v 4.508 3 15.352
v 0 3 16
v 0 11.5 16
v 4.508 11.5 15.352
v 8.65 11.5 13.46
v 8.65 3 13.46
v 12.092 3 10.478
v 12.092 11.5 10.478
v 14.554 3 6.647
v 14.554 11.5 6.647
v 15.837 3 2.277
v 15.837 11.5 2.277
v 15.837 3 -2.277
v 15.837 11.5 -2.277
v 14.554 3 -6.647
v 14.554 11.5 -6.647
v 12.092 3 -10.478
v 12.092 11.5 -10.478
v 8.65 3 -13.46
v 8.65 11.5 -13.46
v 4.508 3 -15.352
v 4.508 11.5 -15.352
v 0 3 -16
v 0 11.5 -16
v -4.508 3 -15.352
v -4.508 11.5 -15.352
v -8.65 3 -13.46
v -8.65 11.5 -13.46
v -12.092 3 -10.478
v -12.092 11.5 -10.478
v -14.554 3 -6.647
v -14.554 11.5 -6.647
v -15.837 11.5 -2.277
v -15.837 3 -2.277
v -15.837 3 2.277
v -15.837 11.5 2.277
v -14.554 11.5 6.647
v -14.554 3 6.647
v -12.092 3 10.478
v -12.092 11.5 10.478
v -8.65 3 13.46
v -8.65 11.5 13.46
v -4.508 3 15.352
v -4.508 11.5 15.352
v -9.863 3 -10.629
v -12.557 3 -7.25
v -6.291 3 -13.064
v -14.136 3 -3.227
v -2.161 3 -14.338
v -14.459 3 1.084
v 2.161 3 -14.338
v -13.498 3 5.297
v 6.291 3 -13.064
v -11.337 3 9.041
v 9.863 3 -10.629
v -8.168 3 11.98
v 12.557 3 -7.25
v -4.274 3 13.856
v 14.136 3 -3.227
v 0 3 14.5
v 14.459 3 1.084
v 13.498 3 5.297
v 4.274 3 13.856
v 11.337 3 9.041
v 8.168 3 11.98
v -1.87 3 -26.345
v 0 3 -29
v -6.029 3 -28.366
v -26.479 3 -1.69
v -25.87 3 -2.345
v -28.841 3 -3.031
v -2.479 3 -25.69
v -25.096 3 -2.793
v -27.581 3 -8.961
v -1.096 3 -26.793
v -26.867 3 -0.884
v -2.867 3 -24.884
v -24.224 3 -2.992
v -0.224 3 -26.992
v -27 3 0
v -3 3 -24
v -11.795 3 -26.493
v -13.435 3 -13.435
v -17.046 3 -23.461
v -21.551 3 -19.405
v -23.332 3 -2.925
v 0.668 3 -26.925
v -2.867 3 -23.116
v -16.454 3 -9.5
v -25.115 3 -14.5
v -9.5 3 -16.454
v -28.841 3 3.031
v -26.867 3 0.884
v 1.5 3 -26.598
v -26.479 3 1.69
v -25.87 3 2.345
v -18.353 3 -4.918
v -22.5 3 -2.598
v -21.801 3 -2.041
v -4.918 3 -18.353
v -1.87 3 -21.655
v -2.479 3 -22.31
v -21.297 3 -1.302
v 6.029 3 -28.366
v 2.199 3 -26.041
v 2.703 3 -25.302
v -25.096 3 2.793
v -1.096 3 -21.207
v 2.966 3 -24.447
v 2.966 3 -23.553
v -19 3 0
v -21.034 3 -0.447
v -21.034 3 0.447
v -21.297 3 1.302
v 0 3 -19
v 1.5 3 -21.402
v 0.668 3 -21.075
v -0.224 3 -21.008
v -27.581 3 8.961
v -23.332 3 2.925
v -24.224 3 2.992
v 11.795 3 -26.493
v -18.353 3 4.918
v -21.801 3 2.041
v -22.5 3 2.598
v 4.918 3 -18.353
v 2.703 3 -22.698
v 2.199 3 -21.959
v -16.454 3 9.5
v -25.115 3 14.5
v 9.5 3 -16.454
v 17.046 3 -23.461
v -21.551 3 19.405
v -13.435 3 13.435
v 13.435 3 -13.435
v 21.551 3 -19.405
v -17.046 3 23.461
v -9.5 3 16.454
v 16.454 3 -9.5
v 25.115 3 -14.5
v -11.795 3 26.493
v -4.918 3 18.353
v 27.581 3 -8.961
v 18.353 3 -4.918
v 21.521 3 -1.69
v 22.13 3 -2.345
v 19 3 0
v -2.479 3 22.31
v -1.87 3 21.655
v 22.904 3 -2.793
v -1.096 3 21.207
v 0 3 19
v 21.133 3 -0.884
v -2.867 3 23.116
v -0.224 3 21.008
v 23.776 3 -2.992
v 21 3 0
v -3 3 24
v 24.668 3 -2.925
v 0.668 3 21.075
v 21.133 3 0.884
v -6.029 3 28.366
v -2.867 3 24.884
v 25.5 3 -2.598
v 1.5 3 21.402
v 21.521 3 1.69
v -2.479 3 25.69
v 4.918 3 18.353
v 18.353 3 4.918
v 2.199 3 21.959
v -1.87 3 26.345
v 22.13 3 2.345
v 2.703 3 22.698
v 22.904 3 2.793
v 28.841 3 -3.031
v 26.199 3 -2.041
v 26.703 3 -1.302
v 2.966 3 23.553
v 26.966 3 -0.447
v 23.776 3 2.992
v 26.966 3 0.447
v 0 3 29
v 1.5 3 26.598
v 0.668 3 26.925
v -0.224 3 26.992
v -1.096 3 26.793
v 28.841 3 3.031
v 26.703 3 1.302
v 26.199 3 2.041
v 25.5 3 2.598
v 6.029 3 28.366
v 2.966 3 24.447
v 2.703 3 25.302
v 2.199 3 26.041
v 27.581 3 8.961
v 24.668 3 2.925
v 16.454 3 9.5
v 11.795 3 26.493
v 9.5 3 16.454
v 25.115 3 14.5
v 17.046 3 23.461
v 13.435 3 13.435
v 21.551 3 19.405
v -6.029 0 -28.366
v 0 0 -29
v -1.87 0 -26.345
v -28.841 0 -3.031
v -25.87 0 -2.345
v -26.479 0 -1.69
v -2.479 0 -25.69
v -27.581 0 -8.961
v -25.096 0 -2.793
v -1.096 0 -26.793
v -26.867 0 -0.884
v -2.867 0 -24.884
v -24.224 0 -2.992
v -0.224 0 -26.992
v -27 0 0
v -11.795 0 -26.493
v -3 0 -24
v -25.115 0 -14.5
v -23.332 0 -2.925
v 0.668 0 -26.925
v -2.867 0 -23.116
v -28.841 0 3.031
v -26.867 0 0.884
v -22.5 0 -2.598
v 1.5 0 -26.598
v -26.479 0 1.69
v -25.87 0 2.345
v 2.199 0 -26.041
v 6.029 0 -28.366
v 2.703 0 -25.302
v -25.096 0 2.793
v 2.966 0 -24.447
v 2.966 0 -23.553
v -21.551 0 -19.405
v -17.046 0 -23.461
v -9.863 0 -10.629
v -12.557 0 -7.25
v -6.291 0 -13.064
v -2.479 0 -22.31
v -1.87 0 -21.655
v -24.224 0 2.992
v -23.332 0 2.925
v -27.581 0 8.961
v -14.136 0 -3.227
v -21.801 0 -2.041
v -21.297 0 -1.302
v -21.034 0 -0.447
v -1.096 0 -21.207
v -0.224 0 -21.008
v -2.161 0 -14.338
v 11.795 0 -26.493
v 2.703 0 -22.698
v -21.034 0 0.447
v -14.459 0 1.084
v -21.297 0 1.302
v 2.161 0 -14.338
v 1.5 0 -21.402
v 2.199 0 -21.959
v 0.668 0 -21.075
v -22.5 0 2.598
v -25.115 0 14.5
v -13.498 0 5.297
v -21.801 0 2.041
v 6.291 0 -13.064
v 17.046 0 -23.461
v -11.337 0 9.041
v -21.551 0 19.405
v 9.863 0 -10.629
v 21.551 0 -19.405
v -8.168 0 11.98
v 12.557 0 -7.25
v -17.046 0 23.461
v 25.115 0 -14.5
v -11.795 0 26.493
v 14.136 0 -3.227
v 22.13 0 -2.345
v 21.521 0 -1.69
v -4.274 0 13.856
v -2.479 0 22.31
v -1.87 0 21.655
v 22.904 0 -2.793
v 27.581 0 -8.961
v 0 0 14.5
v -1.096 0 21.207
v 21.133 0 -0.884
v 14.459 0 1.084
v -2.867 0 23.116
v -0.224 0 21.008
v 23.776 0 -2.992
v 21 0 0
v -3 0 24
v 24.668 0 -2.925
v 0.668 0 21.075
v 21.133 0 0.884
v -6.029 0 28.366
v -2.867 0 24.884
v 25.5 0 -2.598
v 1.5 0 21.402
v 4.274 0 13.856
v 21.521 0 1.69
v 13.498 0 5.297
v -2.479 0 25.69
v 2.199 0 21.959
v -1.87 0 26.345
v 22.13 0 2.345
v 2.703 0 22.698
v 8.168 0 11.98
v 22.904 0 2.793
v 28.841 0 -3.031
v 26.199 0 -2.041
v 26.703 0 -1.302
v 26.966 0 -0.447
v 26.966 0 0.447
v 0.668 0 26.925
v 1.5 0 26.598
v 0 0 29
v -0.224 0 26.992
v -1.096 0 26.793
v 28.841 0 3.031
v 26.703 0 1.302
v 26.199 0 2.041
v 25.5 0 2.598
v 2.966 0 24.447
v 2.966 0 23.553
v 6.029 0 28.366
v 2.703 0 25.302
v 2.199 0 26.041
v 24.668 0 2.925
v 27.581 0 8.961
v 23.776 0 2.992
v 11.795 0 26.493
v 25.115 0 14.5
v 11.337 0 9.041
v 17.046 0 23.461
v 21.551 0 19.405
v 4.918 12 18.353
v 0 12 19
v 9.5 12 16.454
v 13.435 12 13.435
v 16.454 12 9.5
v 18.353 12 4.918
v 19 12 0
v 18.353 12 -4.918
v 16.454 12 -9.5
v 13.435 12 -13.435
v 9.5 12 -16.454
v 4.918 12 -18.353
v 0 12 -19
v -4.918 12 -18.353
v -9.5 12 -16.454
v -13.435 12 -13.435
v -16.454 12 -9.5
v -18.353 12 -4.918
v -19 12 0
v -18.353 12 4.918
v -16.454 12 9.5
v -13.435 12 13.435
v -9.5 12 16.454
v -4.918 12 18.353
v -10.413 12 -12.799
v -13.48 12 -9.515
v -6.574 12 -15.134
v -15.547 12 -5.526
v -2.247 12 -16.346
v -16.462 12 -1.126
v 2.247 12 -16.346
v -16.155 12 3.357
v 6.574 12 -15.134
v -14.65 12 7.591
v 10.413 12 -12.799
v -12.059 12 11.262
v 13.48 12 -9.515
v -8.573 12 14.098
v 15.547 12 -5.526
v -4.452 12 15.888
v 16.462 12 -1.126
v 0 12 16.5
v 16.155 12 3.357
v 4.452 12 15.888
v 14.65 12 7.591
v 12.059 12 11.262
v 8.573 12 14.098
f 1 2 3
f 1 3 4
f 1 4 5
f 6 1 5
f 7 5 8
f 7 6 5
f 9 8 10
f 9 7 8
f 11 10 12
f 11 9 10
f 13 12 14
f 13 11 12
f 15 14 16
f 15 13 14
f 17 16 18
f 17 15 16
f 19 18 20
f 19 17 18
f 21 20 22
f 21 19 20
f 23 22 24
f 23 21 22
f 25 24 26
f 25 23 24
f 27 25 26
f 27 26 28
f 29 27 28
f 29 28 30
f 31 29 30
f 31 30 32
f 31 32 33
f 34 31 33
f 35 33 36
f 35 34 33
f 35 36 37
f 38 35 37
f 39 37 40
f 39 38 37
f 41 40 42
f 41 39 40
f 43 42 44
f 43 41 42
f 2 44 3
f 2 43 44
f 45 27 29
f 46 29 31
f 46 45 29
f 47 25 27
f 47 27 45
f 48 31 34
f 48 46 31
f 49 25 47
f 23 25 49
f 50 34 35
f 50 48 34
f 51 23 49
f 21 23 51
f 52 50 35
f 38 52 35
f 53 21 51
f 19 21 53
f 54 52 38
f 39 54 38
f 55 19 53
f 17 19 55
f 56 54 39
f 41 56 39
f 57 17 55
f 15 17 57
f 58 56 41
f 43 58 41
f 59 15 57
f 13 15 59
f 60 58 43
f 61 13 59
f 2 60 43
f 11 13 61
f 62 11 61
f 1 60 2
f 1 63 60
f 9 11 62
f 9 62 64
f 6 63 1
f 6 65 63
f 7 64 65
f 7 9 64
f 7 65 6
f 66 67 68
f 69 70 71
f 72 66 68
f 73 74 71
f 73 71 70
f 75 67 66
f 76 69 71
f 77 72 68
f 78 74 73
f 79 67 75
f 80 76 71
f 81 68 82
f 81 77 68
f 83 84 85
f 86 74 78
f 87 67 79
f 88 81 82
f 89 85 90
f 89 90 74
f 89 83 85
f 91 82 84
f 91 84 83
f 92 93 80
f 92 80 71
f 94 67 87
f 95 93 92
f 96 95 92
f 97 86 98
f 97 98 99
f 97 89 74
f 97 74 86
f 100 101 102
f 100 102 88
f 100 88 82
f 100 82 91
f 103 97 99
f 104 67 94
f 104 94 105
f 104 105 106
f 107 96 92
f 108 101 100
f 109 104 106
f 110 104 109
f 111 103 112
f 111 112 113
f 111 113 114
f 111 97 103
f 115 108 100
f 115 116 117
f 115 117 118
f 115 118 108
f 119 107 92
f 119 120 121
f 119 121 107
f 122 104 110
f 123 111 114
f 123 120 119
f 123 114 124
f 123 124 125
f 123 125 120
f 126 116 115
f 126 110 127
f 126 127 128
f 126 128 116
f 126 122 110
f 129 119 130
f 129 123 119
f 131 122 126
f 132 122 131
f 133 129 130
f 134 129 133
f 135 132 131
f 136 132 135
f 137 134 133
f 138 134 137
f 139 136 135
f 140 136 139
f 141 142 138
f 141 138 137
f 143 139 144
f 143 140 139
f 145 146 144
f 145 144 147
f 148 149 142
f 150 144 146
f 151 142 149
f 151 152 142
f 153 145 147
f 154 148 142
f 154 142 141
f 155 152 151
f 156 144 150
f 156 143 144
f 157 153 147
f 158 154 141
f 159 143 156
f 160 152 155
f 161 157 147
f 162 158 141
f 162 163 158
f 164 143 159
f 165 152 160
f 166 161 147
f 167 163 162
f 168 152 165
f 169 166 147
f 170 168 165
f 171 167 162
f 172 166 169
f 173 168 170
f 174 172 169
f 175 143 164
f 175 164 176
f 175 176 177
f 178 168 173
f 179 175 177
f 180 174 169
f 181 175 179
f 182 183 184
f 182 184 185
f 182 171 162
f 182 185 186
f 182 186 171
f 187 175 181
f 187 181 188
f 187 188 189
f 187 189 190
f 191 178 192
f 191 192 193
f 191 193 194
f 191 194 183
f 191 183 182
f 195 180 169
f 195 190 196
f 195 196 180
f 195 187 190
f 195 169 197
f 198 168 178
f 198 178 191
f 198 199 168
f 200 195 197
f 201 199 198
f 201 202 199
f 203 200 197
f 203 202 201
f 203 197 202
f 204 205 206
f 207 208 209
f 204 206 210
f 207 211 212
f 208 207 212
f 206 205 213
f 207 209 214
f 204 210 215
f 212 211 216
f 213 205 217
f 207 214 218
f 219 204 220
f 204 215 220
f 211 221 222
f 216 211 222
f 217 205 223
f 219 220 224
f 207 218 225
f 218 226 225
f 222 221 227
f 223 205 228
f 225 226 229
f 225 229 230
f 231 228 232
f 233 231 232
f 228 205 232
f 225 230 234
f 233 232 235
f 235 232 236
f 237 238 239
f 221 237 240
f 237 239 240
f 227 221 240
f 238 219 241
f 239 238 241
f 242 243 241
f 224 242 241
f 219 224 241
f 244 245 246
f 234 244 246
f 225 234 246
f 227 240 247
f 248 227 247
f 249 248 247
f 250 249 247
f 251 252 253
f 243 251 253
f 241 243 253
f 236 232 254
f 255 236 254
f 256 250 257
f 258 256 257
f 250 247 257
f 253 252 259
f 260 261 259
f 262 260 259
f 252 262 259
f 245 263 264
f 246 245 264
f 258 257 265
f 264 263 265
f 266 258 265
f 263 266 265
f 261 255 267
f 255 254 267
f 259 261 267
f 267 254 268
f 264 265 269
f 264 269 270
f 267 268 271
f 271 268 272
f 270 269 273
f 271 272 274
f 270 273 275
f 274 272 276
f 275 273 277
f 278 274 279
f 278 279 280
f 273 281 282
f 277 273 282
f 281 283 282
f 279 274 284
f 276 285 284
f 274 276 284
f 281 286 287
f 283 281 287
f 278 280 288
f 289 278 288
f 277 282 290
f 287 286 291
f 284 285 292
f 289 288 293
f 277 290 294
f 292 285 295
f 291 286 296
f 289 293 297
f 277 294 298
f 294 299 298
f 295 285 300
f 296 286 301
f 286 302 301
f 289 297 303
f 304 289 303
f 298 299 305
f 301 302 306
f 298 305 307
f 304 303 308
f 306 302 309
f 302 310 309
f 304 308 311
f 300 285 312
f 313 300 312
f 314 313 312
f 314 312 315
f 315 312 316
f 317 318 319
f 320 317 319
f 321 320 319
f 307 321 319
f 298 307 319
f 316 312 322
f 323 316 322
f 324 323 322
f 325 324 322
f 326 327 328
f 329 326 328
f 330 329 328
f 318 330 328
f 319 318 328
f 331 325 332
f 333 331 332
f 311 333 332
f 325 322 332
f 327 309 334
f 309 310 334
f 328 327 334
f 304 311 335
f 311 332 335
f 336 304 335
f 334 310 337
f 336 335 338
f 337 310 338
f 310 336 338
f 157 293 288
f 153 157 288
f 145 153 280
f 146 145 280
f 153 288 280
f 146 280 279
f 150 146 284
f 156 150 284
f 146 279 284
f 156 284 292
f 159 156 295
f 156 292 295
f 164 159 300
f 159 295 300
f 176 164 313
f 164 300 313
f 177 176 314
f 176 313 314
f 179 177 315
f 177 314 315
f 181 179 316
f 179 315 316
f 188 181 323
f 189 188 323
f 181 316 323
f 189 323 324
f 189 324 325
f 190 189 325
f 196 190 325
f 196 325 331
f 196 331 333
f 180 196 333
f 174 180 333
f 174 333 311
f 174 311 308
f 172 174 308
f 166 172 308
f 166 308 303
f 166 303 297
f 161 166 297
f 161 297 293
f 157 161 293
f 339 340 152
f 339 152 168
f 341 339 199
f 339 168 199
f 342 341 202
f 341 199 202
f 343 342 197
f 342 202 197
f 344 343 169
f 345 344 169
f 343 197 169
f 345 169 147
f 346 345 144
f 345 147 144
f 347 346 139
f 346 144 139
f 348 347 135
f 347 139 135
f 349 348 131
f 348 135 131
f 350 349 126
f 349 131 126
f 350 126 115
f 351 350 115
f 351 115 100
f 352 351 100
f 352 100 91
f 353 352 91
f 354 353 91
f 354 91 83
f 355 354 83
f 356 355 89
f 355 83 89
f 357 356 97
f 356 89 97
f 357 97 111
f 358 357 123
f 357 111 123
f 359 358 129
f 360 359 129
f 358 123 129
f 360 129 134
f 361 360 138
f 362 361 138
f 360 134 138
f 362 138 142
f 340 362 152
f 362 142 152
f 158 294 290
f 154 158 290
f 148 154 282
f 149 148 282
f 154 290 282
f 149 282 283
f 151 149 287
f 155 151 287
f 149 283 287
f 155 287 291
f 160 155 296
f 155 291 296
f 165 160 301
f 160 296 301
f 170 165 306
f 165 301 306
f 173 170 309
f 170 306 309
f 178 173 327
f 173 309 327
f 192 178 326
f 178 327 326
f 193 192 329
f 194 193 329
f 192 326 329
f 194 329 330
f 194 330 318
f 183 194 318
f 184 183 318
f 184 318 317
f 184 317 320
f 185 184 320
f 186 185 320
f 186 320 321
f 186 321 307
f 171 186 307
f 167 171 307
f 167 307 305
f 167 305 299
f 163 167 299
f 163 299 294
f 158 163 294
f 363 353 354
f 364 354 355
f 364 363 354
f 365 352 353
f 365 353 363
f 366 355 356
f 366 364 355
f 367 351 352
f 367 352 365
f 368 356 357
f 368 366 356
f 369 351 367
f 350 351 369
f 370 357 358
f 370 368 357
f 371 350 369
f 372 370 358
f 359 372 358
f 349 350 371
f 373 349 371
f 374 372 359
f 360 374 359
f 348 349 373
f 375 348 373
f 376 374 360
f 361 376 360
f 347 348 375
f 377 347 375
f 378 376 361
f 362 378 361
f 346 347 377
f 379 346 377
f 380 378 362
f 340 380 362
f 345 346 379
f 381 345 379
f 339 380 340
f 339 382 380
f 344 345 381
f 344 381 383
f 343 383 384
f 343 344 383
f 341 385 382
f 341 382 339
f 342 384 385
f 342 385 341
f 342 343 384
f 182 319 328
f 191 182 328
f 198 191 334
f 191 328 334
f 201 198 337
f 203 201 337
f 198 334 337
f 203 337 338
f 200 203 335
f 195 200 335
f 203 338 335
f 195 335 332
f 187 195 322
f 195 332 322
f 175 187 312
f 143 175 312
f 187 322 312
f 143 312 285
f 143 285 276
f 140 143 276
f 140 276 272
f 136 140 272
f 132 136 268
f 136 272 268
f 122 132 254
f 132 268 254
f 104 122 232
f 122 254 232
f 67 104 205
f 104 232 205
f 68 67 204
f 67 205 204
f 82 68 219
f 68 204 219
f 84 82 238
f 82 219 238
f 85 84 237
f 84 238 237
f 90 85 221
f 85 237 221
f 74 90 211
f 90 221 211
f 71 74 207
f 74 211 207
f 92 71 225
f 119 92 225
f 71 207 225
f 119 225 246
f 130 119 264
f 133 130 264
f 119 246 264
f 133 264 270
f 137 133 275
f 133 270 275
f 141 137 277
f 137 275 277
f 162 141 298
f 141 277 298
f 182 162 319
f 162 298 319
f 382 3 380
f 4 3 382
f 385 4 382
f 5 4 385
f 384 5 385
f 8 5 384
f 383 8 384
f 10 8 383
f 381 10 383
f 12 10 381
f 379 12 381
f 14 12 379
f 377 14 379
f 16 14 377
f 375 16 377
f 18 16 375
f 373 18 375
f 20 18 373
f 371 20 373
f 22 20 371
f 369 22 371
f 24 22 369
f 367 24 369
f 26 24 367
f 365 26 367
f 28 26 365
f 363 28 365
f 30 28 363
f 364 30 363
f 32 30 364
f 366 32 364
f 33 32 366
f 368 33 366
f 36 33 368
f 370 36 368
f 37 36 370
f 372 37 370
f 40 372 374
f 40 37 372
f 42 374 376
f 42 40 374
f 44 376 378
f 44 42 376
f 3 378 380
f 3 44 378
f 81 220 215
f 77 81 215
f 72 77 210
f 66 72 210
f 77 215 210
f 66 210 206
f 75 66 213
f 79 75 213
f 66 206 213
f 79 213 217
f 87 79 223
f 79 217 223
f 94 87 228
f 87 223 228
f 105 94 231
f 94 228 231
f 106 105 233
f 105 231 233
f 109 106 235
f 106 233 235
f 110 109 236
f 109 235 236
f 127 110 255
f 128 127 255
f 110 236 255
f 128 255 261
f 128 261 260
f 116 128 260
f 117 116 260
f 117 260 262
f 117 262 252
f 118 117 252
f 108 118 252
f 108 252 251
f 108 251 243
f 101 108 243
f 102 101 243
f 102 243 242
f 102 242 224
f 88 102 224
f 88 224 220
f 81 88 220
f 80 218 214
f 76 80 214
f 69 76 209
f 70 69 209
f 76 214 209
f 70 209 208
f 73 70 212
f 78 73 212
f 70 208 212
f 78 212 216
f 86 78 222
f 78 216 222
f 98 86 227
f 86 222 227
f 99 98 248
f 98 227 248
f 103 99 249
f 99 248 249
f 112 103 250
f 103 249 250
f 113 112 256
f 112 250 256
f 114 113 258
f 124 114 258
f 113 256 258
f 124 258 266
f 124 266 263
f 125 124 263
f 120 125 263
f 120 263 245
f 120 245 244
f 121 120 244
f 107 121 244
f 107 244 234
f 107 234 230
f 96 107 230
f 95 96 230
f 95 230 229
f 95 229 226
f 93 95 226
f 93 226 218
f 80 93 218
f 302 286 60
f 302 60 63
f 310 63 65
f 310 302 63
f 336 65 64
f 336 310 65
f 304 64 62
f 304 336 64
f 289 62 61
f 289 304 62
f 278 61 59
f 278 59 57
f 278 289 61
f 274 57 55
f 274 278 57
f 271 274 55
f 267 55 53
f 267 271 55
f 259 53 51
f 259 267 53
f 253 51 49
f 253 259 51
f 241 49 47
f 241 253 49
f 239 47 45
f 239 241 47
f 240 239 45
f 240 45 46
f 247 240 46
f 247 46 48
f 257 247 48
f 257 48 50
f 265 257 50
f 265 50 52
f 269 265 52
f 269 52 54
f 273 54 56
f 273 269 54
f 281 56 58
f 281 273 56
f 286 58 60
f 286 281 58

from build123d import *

# Parameters (mm, degrees)
SKETCH1_R             = 29
SKETCH1_R_2           = 14.5
SKETCH1_R_3           = 1
BOSS_EXTRUDE1_DEPTH   = 3
SKETCH2_R             = 19
SKETCH2_R_2           = 16
BOSS_EXTRUDE2_DEPTH   = 9
F_6_0MM_DOWEL_HOLE1_D = 6
CHAMFER1_SIZE         = 0.5


with BuildPart() as part:
    # Sketch1 → Boss-Extrude1 (new body)
    with BuildSketch(Plane(origin=(0, 0, 0), x_dir=(1, 0, 0), z_dir=(0, 1, 0))):
        with Locations(Location((0, 0, 0), (0, 0, 270))):
            Circle(SKETCH1_R)
        with Locations(Location((0, 0, 0), (0, 0, 270))):
            Circle(SKETCH1_R_2, mode=Mode.SUBTRACT)
        with Locations(Location((0, 24, 0), (0, 0, 270))):
            Circle(SKETCH1_R_3, mode=Mode.SUBTRACT)
        with Locations(Location((24, 0, 0), (0, 0, 270))):
            Circle(SKETCH1_R_3, mode=Mode.SUBTRACT)
        with Locations(Location((0, -24, 0), (0, 0, 270))):
            Circle(SKETCH1_R_3, mode=Mode.SUBTRACT)
        with Locations(Location((-24, 0, 0), (0, 0, 270))):
            Circle(SKETCH1_R_3, mode=Mode.SUBTRACT)
    extrude(amount=BOSS_EXTRUDE1_DEPTH)

    # Sketch2 → Boss-Extrude2 (add)
    with BuildSketch(Plane(origin=(0, 3, 0), x_dir=(1, 0, 0), z_dir=(0, 1, 0))):
        with Locations(Location((0, 0, 0), (0, 0, 270))):
            Circle(SKETCH2_R)
        with Locations(Location((0, 0, 0), (0, 0, 270))):
            Circle(SKETCH2_R_2, mode=Mode.SUBTRACT)
    extrude(amount=BOSS_EXTRUDE2_DEPTH)

    # Ø6.0mm Dowel Hole1 (through all)
    with Locations(Plane(origin=(0, 3, 0), x_dir=(1, 0, 0), z_dir=(0, 1, 0))):
        with Locations((0, 24), (24, 0), (0, -24), (-24, 0)):
            Hole(F_6_0MM_DOWEL_HOLE1_D / 2)

    # Chamfer1
    chamfer1_edges = [part.edges().sort_by_distance(p)[0] for p in [
        (0, 12, -16),
    ]]
    chamfer(chamfer1_edges, length=CHAMFER1_SIZE)


solid = part.part
